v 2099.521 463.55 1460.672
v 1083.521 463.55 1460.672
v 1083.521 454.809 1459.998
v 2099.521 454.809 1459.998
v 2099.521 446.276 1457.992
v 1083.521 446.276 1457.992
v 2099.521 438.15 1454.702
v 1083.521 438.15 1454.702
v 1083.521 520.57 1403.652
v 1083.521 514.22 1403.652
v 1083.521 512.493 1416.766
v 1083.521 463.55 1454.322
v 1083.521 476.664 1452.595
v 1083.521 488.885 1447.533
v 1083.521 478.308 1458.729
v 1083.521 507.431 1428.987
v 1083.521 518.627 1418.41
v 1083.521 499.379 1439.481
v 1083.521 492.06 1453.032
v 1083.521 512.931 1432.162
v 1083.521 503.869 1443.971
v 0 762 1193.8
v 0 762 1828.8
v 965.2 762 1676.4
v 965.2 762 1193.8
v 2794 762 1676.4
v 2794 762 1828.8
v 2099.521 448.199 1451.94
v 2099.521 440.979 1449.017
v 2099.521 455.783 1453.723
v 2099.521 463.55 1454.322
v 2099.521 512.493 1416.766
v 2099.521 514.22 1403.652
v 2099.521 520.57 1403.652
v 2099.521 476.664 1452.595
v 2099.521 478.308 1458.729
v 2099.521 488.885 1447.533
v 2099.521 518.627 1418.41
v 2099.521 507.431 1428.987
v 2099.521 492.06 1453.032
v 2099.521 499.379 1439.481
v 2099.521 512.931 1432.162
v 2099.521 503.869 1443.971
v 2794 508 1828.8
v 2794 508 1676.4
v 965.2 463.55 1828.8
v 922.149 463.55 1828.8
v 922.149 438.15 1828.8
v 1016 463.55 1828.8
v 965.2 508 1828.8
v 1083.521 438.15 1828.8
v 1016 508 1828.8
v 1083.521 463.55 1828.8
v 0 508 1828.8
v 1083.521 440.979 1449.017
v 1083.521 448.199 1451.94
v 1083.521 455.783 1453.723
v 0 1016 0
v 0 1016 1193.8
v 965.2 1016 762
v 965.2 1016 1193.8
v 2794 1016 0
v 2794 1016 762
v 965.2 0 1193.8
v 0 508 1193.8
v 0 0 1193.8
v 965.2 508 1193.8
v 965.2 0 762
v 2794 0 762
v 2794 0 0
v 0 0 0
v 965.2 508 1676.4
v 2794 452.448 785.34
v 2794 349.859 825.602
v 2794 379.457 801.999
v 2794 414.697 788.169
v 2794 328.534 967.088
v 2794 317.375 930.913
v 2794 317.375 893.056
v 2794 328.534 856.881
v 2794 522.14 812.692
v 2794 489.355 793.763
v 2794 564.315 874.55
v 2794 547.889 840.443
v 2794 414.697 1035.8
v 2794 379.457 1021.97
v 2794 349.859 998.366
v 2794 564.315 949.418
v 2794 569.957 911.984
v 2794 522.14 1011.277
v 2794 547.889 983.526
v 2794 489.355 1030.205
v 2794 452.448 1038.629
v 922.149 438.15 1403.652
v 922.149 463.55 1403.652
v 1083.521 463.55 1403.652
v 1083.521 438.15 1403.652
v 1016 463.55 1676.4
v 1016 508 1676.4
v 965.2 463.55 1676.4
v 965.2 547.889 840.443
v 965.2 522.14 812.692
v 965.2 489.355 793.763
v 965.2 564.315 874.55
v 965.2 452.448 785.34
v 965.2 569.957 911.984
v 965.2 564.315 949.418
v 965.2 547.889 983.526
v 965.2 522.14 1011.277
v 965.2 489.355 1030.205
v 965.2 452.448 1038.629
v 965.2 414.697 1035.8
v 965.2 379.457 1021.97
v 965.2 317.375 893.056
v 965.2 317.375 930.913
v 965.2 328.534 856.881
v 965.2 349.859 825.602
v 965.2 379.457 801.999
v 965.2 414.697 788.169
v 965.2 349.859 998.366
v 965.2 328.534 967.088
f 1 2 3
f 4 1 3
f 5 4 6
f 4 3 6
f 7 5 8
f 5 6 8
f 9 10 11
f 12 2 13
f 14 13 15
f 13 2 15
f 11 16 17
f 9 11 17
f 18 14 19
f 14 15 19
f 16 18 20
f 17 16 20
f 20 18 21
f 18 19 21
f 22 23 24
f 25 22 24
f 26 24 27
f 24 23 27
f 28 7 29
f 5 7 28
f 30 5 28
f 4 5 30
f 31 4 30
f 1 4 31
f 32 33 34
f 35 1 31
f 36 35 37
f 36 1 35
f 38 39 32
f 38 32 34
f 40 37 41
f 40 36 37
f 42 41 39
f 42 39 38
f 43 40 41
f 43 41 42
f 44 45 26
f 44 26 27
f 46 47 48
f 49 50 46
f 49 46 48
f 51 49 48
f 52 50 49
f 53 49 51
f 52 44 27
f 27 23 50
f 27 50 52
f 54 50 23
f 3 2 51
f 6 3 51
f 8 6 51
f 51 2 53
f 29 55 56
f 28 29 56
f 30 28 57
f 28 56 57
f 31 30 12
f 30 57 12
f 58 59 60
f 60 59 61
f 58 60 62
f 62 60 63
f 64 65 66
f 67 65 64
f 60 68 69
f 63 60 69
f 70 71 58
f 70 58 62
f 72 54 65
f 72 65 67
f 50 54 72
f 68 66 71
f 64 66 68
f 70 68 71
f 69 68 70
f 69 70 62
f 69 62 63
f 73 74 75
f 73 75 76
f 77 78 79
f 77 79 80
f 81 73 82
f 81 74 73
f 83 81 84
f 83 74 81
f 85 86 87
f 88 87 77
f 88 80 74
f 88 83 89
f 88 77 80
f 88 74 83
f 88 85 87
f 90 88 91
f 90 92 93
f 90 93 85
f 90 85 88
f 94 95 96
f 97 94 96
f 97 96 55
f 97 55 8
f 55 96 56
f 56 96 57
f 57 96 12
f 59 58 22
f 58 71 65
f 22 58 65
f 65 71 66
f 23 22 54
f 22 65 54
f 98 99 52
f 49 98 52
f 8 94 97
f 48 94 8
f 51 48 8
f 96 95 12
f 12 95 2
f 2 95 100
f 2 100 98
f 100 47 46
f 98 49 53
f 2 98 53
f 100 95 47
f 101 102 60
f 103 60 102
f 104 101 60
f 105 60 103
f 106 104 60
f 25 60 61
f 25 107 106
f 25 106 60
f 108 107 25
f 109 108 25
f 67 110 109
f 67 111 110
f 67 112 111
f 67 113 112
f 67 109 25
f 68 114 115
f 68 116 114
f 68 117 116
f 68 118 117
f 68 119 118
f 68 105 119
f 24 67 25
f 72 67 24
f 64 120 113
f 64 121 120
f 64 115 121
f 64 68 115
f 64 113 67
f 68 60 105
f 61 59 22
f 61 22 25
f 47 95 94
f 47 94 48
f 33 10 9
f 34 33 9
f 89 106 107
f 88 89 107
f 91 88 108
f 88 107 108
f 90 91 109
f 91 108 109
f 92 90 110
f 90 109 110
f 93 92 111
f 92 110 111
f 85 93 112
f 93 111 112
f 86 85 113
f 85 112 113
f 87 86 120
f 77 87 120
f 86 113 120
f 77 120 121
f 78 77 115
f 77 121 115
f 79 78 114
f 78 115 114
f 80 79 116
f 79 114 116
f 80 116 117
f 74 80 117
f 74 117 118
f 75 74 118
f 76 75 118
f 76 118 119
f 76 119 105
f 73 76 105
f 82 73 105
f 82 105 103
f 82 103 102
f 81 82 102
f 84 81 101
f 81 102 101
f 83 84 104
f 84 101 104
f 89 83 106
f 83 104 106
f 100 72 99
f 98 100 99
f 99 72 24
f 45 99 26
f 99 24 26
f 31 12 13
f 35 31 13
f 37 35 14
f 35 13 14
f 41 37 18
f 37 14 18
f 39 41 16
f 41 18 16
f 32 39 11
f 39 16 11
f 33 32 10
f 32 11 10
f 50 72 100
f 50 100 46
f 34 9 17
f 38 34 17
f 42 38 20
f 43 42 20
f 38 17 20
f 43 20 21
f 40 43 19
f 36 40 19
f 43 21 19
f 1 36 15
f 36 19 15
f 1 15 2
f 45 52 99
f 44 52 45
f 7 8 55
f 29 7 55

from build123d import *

# Parameters (mm, degrees)
F0_W      = 2794
F0_H      = 1828.8
F1_DEPTH  = 1016
F2_W      = 1828.8
F2_H      = 914.4
F3_DEPTH  = 1016.001
F4_W      = 2794
F4_H      = 508
F5_DEPTH  = 635
F6_W      = 2794
F6_H      = 254
F7_DEPTH  = 635
F8_R      = 127
F9_DEPTH  = 1828.8
F10_W     = 50.8
F10_H     = 152.4
F11_DEPTH = 44.45
F12_W     = 161.37141
F12_H     = 425.148166
F13_DEPTH = 25.4
F15_DEPTH = 1016


with BuildPart() as f1:
    # F0 (on Front) → F1 (new body)
    with BuildSketch(Plane.XZ):
        with Locations((1397, 914.4)):
            Rectangle(F0_W, F0_H)
    extrude(amount=-F1_DEPTH)

    # F2 (on face) → F3 (cut, through all)
    with BuildSketch(Plane.XZ):
        with Locations((1879.6, 1219.2)):
            Rectangle(F2_W, F2_H)
    extrude(amount=-F3_DEPTH, mode=Mode.SUBTRACT)

    # F4 (on face) → F5 (cut)
    with BuildSketch(Plane.XY.offset(1828.8)):
        with Locations((1397, 254)):
            Rectangle(F4_W, F4_H)
    extrude(amount=-F5_DEPTH, mode=Mode.SUBTRACT)

    # F6 (on face) → F7 (cut)
    with BuildSketch(Plane.XY.offset(1828.8)):
        with Locations((1397, 889)):
            Rectangle(F6_W, F6_H)
    extrude(amount=-F7_DEPTH, mode=Mode.SUBTRACT)

    # F8 (on face) → F9 (join)
    with BuildSketch(Plane.YZ.offset(965.2)):
        with Locations((442.956924, 911.984384)):
            Circle(F8_R)
    extrude(amount=F9_DEPTH)

    # F10 (on face) → F11 (join)
    with BuildSketch(Plane.XZ.offset(-508)):
        with Locations((990.6, 1752.6)):
            Rectangle(F10_W, F10_H)
    extrude(amount=F11_DEPTH)

    # F12 (on face) → F13 (join)
    with BuildSketch(Plane.XZ.offset(-463.55)):
        with Locations((1002.835065, 1616.225917)):
            Rectangle(F12_W, F12_H)
    extrude(amount=F13_DEPTH)

    # F14 (on face) → F15 (join)
    with BuildSketch(Plane.YZ.offset(1083.52077)):
        with BuildLine():
            Line((514.219801, 1403.651834), (520.569801, 1403.651834))
            ThreePointArc((520.569801, 1403.651834), (503.869088, 1443.970922), (463.55, 1460.671635))
            Line((463.55, 1460.671635), (463.55, 1454.321635))
            ThreePointArc((463.55, 1454.321635), (499.37896, 1439.480794), (514.219801, 1403.651834))
        make_face()
        with BuildLine():
            Line((463.55, 1454.321635), (463.55, 1460.671635))
            ThreePointArc((463.55, 1460.671635), (450.503937, 1459.159112), (438.15, 1454.701787))
            Line((438.15, 1454.701787), (440.978666, 1449.016618))
            ThreePointArc((440.978666, 1449.016618), (451.956809, 1452.977554), (463.55, 1454.321635))
        make_face()
    extrude(amount=F15_DEPTH)


solid = f1.part
